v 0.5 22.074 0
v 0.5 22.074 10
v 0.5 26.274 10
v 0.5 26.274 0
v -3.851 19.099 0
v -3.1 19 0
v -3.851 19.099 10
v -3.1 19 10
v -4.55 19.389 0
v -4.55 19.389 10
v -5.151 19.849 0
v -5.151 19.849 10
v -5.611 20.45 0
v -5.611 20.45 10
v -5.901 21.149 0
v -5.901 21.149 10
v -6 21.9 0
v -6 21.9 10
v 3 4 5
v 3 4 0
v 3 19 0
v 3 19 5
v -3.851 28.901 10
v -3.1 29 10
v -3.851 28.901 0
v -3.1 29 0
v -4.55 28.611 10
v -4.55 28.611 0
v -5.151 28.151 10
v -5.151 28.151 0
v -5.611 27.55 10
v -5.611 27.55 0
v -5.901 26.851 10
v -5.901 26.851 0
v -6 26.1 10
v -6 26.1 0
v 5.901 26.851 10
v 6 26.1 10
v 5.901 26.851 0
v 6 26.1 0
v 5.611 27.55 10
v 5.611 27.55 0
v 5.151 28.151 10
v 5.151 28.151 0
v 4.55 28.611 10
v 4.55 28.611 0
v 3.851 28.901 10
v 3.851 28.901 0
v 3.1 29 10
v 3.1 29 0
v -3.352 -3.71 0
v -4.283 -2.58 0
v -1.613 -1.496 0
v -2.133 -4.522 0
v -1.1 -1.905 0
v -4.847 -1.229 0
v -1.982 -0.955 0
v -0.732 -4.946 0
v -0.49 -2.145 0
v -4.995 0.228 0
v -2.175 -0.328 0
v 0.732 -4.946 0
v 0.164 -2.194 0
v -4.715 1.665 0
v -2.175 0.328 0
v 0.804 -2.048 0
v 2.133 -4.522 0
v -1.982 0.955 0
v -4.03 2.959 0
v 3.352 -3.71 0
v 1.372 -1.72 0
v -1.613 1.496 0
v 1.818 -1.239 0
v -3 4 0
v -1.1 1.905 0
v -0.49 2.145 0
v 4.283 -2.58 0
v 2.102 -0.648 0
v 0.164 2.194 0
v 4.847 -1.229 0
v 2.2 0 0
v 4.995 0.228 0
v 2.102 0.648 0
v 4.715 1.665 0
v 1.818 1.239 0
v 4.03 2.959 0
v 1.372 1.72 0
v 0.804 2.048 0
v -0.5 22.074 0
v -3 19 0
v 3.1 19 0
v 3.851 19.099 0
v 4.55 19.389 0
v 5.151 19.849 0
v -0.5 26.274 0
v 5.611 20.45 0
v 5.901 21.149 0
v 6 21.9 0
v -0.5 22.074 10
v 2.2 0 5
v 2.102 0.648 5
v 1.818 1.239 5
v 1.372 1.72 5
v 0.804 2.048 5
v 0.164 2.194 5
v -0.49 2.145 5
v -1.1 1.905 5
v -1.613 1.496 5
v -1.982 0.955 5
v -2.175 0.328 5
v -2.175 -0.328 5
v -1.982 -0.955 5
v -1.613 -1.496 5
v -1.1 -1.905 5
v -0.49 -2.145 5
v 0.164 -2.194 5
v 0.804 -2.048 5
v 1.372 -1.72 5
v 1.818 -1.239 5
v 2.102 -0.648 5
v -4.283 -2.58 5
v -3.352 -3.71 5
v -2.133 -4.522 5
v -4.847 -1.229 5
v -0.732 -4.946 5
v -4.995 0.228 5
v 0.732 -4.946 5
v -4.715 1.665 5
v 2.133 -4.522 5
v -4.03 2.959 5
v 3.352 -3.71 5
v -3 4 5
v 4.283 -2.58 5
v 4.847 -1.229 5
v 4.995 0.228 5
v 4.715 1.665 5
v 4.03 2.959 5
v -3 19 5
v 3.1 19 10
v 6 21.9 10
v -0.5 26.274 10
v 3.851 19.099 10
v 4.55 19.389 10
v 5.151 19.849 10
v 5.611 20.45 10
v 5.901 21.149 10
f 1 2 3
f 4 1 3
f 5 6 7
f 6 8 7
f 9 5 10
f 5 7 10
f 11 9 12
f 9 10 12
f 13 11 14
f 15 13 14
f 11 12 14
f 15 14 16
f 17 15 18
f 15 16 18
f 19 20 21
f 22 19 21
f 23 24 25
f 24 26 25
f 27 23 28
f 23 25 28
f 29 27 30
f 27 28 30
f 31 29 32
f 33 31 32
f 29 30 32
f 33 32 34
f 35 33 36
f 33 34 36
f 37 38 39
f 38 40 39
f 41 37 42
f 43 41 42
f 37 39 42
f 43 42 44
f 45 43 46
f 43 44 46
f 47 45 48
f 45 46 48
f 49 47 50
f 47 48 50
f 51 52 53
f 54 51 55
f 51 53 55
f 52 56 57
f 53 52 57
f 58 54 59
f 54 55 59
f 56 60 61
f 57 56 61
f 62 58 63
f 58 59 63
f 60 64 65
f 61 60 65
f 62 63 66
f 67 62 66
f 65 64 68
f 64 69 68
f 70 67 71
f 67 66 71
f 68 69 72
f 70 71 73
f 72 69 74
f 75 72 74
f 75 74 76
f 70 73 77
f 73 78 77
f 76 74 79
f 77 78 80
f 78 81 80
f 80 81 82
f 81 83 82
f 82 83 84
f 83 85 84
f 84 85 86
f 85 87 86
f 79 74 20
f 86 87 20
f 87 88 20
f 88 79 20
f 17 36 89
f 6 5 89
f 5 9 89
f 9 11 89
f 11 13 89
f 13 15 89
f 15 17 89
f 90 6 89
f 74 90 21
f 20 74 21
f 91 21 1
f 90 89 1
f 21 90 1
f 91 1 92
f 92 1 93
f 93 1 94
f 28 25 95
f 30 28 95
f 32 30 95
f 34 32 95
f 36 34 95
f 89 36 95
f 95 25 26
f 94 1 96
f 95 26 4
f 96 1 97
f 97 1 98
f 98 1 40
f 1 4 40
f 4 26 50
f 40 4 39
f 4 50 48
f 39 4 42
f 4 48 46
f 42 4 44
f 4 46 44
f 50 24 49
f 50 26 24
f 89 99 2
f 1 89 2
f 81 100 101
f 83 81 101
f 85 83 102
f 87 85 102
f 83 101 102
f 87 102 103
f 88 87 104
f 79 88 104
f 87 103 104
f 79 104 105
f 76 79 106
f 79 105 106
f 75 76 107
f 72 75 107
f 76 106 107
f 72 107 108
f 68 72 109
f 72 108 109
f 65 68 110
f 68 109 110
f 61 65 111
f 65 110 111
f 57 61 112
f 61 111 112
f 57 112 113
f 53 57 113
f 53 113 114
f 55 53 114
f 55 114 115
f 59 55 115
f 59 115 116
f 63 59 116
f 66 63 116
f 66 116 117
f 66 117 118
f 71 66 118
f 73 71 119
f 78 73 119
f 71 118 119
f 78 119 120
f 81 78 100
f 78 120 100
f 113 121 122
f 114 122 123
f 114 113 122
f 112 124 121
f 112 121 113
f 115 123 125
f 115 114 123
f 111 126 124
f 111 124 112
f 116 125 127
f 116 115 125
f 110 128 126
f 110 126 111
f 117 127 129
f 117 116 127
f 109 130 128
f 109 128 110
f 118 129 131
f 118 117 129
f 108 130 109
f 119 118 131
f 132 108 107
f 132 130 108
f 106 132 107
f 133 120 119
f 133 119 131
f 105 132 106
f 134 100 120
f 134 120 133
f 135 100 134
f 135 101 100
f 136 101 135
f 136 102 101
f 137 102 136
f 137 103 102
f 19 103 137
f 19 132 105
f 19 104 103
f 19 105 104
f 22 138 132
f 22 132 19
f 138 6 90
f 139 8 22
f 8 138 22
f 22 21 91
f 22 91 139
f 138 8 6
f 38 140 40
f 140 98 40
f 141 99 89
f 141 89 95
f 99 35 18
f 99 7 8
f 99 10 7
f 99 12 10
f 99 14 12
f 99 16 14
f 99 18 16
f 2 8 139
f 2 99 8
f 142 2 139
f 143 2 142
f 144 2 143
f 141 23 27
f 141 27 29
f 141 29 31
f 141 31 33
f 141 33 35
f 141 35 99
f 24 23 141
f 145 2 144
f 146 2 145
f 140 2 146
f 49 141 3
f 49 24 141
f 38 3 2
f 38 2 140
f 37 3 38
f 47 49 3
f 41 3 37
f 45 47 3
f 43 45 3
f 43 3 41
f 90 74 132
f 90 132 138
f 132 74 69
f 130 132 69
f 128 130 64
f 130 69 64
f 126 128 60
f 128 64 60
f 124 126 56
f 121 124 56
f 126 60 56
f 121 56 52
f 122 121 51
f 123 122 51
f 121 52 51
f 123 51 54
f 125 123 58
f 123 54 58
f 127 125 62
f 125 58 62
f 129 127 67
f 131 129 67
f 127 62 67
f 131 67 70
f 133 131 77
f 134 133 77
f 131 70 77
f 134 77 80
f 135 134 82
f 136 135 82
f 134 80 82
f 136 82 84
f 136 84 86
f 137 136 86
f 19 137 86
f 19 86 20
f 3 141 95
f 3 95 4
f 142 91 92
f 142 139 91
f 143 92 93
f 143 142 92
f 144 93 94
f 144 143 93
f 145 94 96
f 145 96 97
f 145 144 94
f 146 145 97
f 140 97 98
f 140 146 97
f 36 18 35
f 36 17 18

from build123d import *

# Parameters (mm, degrees)
PAD_DEPTH       = 5
SKETCH001_W     = 12
SKETCH001_H     = 10
PAD001_DEPTH    = 5
SKETCH002_W     = 1
SKETCH002_H     = 4.2
POCKET_DEPTH    = 10
FILLET_R        = 2.9
FILLET001_R     = 2.9
FILLET002_R     = 2.9
FILLET003_R     = 2.9
SKETCH003_R     = 2.2
POCKET001_DEPTH = 5


with BuildPart() as part:
    # Sketch → Pad (new body)
    with BuildSketch(Plane.XY):
        with BuildLine():
            ThreePointArc((-3, 4), (0, -5), (3, 4))
            Line((3, 4), (3, 19))
            Line((6, 19), (3, 19))
            Line((6, 29), (6, 19))
            Line((-6, 29), (6, 29))
            Line((-6, 19), (-6, 29))
            Line((-3, 19), (-6, 19))
            Line((-3, 4), (-3, 19))
        make_face()
    extrude(amount=PAD_DEPTH)

    # Sketch001 (on Face10 of Pad) → Pad001 (join)
    with BuildSketch(Plane.XY.offset(5)):
        with Locations((0, 24)):
            Rectangle(SKETCH001_W, SKETCH001_H)
    extrude(amount=PAD001_DEPTH)

    # Sketch002 (on Face15 of Pad001) → Pocket (cut)
    with BuildSketch(Plane.XY.offset(10)):
        with Locations((0, 24.173883)):
            Rectangle(SKETCH002_W, SKETCH002_H)
    extrude(amount=-POCKET_DEPTH, mode=Mode.SUBTRACT)

    # Fillet
    fillet_edges = [part.edges().sort_by_distance(p)[0] for p in [
        (6, 19, 7.5),
    ]]
    fillet(fillet_edges, radius=FILLET_R)

    # Fillet001
    fillet001_edges = [part.edges().sort_by_distance(p)[0] for p in [
        (-6, 19, 7.5),
    ]]
    fillet(fillet001_edges, radius=FILLET001_R)

    # Fillet002
    fillet002_edges = [part.edges().sort_by_distance(p)[0] for p in [
        (6, 29, 7.5),
    ]]
    fillet(fillet002_edges, radius=FILLET002_R)

    # Fillet003
    fillet003_edges = [part.edges().sort_by_distance(p)[0] for p in [
        (-6, 29, 7.5),
    ]]
    fillet(fillet003_edges, radius=FILLET003_R)

    # Sketch003 (on Face26 of Fillet003) → Pocket001 (cut)
    with BuildSketch(Plane.XY.offset(5)):
        Circle(SKETCH003_R)
    extrude(amount=-POCKET001_DEPTH, mode=Mode.SUBTRACT)


solid = part.part
